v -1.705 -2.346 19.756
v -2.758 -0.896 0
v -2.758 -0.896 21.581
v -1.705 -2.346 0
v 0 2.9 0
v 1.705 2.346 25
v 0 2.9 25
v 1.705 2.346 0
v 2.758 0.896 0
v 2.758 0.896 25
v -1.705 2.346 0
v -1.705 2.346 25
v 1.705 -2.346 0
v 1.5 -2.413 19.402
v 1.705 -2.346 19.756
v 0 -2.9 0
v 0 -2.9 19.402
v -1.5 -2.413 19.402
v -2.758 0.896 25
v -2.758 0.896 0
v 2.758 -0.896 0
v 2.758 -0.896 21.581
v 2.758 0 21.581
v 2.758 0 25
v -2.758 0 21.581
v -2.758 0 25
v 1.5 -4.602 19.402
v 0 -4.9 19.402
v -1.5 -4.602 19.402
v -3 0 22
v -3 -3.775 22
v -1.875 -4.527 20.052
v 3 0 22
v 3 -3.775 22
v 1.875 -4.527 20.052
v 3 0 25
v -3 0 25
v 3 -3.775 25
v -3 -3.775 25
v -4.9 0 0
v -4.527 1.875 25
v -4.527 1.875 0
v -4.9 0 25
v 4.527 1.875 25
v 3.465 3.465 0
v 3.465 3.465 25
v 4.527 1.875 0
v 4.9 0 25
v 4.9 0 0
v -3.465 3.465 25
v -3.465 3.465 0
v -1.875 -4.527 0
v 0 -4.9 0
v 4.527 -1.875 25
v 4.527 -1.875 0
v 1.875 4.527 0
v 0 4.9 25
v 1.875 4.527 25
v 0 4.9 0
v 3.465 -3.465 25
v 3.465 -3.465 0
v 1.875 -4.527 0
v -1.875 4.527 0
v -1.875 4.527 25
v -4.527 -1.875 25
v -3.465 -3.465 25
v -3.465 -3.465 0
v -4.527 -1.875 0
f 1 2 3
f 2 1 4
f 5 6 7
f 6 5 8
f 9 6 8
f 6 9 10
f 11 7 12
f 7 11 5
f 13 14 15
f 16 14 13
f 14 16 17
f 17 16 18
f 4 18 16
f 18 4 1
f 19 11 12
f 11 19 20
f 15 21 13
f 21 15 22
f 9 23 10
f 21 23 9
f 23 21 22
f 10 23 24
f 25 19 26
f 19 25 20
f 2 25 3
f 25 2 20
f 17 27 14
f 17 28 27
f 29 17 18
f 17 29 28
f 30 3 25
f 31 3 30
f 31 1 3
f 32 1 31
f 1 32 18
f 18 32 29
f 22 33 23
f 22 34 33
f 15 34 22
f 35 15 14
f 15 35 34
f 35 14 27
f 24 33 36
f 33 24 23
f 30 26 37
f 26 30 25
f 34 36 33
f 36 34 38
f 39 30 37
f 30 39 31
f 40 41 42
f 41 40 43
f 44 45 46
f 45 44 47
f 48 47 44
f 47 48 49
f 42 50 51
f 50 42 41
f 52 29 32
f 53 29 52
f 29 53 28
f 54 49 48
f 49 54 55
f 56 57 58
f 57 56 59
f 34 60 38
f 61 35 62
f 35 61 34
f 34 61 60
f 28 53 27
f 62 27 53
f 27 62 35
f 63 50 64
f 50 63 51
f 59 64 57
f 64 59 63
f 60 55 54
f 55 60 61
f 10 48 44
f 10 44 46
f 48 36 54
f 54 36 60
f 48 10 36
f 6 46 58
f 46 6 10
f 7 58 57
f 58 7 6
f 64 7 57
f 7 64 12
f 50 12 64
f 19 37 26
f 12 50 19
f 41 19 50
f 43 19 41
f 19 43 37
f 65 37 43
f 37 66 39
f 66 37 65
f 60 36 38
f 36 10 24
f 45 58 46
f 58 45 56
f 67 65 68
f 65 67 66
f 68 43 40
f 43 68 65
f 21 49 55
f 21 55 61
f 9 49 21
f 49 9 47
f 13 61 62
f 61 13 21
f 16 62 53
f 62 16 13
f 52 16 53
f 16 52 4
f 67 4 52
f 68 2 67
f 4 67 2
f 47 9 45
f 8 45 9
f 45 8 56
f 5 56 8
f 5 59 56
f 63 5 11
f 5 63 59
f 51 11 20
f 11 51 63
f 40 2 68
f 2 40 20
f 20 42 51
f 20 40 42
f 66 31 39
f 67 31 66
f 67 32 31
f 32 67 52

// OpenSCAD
//
// Mounts for LEDs.  The modules are parameterized based on the diameter of the LED.
// Since the LEDs don't have mounting hardware, they are just friction fit.
//
// Parameters:
// diameter - the diameter of the LED in mm
// height - the hight (thickness) in mm
//

module bbs_led_mount(diameter, height)
{
    difference()
    {
        union()
        {
            cylinder(h=height, r=diameter/2 + 1);
            translate([-diameter/2 - 2, -2, 0]) cube([2, 4, height]);
        }
        union()
        {
            translate([0, 0, -0.5]) cylinder(h=height + 1, r=diameter/2 - 0.2, $fn=20);
            translate([0.0, -0.5, -0.5]) cube([diameter/2+1.2, 1.0, height + 1]);
        }
    }
}

module bbs_led_cutout(diameter, height)
{
    translate([0, 0, -0.5]) cylinder(h=height + 1, r=diameter/2 + 2);
}
//
// Mount for an LED to attach to an aluminum extrusion.  This inserts into a mount defined in 
// the bbs_t_extrusion file.
//
module extrusion_led()
{
    flange_dia = 5.8;
    lead_space = 1.9;
    small_r = 3*sqrt(3)/2;
    difference()
    {
        union()
        {
            rotate([0, 0, 30]) cylinder(r=3, h=25, $fn=6);
            translate([-small_r, 0, 25+flange_dia/2]) rotate([0, 90, 0]) cylinder(r=flange_dia/2, h=2, $fn=10);
            translate([-small_r, -flange_dia/2, 25]) cube([2, flange_dia, flange_dia/2]);
        }
        union()
        {
            translate([-2.7, lead_space/2, 24.5+flange_dia/2]) cube([3, 1, 1]);
            translate([-2.7, -1-lead_space/2, 24.5+flange_dia/2]) cube([3, 1, 1]);
        }
    }
}
//
// A hood to shield a LED or light detector
//
module bbs_extrusion_led_hood(len, thickness)
{
    height = len;
    difference()
    {
        cylinder(h=height, r=thickness + 5.8/2);
        union()
        {
            translate([0, 0, -0.1]) rotate([0, 0, 18]) cylinder(h=height*2, r=5.8/2, $fn=10);
            translate([0, 0, height-3]) rotate([90, 0, 0]) cylinder(r=3, h=25, $fn=6);
            translate([-3, -(thickness+5.8), height-3]) cube([6, thickness+5.8, 6]);
        }
    }
}
//
// Mount for an CdS photosensor to attach to an aluminum extrusion.  This inserts into a mount defined in 
// the bbs_t_extrusion file.
//
module extrusion_CdS()
{
    flange_dia = 5.8;
    lead_space = 3.1;
    small_r = 3*sqrt(3)/2;
    difference()
    {
        union()
        {
            rotate([0, 0, 30]) cylinder(r=3, h=25, $fn=6);
            translate([-small_r, 0, 25+flange_dia/2]) rotate([0, 90, 0]) cylinder(r=flange_dia/2, h=2, $fn=10);
            translate([-small_r, -flange_dia/2, 25]) cube([2, flange_dia, flange_dia/2]);
        }
        union()
        {
            translate([-2.7, lead_space/2, 24.5+flange_dia/2]) cube([3, 1, 1]);
            translate([-2.7, -1-lead_space/2, 24.5+flange_dia/2]) cube([3, 1, 1]);
        }
    }
}

//rotate([0, -90, 0]) extrusion_led();
//translate([0, 10, 0])
bbs_extrusion_led_hood(25, 2);
//bbs_led_mount(5, 2);
//translate([0, 0, -1]) color("red") bbs_led_cutout(5, 2);
